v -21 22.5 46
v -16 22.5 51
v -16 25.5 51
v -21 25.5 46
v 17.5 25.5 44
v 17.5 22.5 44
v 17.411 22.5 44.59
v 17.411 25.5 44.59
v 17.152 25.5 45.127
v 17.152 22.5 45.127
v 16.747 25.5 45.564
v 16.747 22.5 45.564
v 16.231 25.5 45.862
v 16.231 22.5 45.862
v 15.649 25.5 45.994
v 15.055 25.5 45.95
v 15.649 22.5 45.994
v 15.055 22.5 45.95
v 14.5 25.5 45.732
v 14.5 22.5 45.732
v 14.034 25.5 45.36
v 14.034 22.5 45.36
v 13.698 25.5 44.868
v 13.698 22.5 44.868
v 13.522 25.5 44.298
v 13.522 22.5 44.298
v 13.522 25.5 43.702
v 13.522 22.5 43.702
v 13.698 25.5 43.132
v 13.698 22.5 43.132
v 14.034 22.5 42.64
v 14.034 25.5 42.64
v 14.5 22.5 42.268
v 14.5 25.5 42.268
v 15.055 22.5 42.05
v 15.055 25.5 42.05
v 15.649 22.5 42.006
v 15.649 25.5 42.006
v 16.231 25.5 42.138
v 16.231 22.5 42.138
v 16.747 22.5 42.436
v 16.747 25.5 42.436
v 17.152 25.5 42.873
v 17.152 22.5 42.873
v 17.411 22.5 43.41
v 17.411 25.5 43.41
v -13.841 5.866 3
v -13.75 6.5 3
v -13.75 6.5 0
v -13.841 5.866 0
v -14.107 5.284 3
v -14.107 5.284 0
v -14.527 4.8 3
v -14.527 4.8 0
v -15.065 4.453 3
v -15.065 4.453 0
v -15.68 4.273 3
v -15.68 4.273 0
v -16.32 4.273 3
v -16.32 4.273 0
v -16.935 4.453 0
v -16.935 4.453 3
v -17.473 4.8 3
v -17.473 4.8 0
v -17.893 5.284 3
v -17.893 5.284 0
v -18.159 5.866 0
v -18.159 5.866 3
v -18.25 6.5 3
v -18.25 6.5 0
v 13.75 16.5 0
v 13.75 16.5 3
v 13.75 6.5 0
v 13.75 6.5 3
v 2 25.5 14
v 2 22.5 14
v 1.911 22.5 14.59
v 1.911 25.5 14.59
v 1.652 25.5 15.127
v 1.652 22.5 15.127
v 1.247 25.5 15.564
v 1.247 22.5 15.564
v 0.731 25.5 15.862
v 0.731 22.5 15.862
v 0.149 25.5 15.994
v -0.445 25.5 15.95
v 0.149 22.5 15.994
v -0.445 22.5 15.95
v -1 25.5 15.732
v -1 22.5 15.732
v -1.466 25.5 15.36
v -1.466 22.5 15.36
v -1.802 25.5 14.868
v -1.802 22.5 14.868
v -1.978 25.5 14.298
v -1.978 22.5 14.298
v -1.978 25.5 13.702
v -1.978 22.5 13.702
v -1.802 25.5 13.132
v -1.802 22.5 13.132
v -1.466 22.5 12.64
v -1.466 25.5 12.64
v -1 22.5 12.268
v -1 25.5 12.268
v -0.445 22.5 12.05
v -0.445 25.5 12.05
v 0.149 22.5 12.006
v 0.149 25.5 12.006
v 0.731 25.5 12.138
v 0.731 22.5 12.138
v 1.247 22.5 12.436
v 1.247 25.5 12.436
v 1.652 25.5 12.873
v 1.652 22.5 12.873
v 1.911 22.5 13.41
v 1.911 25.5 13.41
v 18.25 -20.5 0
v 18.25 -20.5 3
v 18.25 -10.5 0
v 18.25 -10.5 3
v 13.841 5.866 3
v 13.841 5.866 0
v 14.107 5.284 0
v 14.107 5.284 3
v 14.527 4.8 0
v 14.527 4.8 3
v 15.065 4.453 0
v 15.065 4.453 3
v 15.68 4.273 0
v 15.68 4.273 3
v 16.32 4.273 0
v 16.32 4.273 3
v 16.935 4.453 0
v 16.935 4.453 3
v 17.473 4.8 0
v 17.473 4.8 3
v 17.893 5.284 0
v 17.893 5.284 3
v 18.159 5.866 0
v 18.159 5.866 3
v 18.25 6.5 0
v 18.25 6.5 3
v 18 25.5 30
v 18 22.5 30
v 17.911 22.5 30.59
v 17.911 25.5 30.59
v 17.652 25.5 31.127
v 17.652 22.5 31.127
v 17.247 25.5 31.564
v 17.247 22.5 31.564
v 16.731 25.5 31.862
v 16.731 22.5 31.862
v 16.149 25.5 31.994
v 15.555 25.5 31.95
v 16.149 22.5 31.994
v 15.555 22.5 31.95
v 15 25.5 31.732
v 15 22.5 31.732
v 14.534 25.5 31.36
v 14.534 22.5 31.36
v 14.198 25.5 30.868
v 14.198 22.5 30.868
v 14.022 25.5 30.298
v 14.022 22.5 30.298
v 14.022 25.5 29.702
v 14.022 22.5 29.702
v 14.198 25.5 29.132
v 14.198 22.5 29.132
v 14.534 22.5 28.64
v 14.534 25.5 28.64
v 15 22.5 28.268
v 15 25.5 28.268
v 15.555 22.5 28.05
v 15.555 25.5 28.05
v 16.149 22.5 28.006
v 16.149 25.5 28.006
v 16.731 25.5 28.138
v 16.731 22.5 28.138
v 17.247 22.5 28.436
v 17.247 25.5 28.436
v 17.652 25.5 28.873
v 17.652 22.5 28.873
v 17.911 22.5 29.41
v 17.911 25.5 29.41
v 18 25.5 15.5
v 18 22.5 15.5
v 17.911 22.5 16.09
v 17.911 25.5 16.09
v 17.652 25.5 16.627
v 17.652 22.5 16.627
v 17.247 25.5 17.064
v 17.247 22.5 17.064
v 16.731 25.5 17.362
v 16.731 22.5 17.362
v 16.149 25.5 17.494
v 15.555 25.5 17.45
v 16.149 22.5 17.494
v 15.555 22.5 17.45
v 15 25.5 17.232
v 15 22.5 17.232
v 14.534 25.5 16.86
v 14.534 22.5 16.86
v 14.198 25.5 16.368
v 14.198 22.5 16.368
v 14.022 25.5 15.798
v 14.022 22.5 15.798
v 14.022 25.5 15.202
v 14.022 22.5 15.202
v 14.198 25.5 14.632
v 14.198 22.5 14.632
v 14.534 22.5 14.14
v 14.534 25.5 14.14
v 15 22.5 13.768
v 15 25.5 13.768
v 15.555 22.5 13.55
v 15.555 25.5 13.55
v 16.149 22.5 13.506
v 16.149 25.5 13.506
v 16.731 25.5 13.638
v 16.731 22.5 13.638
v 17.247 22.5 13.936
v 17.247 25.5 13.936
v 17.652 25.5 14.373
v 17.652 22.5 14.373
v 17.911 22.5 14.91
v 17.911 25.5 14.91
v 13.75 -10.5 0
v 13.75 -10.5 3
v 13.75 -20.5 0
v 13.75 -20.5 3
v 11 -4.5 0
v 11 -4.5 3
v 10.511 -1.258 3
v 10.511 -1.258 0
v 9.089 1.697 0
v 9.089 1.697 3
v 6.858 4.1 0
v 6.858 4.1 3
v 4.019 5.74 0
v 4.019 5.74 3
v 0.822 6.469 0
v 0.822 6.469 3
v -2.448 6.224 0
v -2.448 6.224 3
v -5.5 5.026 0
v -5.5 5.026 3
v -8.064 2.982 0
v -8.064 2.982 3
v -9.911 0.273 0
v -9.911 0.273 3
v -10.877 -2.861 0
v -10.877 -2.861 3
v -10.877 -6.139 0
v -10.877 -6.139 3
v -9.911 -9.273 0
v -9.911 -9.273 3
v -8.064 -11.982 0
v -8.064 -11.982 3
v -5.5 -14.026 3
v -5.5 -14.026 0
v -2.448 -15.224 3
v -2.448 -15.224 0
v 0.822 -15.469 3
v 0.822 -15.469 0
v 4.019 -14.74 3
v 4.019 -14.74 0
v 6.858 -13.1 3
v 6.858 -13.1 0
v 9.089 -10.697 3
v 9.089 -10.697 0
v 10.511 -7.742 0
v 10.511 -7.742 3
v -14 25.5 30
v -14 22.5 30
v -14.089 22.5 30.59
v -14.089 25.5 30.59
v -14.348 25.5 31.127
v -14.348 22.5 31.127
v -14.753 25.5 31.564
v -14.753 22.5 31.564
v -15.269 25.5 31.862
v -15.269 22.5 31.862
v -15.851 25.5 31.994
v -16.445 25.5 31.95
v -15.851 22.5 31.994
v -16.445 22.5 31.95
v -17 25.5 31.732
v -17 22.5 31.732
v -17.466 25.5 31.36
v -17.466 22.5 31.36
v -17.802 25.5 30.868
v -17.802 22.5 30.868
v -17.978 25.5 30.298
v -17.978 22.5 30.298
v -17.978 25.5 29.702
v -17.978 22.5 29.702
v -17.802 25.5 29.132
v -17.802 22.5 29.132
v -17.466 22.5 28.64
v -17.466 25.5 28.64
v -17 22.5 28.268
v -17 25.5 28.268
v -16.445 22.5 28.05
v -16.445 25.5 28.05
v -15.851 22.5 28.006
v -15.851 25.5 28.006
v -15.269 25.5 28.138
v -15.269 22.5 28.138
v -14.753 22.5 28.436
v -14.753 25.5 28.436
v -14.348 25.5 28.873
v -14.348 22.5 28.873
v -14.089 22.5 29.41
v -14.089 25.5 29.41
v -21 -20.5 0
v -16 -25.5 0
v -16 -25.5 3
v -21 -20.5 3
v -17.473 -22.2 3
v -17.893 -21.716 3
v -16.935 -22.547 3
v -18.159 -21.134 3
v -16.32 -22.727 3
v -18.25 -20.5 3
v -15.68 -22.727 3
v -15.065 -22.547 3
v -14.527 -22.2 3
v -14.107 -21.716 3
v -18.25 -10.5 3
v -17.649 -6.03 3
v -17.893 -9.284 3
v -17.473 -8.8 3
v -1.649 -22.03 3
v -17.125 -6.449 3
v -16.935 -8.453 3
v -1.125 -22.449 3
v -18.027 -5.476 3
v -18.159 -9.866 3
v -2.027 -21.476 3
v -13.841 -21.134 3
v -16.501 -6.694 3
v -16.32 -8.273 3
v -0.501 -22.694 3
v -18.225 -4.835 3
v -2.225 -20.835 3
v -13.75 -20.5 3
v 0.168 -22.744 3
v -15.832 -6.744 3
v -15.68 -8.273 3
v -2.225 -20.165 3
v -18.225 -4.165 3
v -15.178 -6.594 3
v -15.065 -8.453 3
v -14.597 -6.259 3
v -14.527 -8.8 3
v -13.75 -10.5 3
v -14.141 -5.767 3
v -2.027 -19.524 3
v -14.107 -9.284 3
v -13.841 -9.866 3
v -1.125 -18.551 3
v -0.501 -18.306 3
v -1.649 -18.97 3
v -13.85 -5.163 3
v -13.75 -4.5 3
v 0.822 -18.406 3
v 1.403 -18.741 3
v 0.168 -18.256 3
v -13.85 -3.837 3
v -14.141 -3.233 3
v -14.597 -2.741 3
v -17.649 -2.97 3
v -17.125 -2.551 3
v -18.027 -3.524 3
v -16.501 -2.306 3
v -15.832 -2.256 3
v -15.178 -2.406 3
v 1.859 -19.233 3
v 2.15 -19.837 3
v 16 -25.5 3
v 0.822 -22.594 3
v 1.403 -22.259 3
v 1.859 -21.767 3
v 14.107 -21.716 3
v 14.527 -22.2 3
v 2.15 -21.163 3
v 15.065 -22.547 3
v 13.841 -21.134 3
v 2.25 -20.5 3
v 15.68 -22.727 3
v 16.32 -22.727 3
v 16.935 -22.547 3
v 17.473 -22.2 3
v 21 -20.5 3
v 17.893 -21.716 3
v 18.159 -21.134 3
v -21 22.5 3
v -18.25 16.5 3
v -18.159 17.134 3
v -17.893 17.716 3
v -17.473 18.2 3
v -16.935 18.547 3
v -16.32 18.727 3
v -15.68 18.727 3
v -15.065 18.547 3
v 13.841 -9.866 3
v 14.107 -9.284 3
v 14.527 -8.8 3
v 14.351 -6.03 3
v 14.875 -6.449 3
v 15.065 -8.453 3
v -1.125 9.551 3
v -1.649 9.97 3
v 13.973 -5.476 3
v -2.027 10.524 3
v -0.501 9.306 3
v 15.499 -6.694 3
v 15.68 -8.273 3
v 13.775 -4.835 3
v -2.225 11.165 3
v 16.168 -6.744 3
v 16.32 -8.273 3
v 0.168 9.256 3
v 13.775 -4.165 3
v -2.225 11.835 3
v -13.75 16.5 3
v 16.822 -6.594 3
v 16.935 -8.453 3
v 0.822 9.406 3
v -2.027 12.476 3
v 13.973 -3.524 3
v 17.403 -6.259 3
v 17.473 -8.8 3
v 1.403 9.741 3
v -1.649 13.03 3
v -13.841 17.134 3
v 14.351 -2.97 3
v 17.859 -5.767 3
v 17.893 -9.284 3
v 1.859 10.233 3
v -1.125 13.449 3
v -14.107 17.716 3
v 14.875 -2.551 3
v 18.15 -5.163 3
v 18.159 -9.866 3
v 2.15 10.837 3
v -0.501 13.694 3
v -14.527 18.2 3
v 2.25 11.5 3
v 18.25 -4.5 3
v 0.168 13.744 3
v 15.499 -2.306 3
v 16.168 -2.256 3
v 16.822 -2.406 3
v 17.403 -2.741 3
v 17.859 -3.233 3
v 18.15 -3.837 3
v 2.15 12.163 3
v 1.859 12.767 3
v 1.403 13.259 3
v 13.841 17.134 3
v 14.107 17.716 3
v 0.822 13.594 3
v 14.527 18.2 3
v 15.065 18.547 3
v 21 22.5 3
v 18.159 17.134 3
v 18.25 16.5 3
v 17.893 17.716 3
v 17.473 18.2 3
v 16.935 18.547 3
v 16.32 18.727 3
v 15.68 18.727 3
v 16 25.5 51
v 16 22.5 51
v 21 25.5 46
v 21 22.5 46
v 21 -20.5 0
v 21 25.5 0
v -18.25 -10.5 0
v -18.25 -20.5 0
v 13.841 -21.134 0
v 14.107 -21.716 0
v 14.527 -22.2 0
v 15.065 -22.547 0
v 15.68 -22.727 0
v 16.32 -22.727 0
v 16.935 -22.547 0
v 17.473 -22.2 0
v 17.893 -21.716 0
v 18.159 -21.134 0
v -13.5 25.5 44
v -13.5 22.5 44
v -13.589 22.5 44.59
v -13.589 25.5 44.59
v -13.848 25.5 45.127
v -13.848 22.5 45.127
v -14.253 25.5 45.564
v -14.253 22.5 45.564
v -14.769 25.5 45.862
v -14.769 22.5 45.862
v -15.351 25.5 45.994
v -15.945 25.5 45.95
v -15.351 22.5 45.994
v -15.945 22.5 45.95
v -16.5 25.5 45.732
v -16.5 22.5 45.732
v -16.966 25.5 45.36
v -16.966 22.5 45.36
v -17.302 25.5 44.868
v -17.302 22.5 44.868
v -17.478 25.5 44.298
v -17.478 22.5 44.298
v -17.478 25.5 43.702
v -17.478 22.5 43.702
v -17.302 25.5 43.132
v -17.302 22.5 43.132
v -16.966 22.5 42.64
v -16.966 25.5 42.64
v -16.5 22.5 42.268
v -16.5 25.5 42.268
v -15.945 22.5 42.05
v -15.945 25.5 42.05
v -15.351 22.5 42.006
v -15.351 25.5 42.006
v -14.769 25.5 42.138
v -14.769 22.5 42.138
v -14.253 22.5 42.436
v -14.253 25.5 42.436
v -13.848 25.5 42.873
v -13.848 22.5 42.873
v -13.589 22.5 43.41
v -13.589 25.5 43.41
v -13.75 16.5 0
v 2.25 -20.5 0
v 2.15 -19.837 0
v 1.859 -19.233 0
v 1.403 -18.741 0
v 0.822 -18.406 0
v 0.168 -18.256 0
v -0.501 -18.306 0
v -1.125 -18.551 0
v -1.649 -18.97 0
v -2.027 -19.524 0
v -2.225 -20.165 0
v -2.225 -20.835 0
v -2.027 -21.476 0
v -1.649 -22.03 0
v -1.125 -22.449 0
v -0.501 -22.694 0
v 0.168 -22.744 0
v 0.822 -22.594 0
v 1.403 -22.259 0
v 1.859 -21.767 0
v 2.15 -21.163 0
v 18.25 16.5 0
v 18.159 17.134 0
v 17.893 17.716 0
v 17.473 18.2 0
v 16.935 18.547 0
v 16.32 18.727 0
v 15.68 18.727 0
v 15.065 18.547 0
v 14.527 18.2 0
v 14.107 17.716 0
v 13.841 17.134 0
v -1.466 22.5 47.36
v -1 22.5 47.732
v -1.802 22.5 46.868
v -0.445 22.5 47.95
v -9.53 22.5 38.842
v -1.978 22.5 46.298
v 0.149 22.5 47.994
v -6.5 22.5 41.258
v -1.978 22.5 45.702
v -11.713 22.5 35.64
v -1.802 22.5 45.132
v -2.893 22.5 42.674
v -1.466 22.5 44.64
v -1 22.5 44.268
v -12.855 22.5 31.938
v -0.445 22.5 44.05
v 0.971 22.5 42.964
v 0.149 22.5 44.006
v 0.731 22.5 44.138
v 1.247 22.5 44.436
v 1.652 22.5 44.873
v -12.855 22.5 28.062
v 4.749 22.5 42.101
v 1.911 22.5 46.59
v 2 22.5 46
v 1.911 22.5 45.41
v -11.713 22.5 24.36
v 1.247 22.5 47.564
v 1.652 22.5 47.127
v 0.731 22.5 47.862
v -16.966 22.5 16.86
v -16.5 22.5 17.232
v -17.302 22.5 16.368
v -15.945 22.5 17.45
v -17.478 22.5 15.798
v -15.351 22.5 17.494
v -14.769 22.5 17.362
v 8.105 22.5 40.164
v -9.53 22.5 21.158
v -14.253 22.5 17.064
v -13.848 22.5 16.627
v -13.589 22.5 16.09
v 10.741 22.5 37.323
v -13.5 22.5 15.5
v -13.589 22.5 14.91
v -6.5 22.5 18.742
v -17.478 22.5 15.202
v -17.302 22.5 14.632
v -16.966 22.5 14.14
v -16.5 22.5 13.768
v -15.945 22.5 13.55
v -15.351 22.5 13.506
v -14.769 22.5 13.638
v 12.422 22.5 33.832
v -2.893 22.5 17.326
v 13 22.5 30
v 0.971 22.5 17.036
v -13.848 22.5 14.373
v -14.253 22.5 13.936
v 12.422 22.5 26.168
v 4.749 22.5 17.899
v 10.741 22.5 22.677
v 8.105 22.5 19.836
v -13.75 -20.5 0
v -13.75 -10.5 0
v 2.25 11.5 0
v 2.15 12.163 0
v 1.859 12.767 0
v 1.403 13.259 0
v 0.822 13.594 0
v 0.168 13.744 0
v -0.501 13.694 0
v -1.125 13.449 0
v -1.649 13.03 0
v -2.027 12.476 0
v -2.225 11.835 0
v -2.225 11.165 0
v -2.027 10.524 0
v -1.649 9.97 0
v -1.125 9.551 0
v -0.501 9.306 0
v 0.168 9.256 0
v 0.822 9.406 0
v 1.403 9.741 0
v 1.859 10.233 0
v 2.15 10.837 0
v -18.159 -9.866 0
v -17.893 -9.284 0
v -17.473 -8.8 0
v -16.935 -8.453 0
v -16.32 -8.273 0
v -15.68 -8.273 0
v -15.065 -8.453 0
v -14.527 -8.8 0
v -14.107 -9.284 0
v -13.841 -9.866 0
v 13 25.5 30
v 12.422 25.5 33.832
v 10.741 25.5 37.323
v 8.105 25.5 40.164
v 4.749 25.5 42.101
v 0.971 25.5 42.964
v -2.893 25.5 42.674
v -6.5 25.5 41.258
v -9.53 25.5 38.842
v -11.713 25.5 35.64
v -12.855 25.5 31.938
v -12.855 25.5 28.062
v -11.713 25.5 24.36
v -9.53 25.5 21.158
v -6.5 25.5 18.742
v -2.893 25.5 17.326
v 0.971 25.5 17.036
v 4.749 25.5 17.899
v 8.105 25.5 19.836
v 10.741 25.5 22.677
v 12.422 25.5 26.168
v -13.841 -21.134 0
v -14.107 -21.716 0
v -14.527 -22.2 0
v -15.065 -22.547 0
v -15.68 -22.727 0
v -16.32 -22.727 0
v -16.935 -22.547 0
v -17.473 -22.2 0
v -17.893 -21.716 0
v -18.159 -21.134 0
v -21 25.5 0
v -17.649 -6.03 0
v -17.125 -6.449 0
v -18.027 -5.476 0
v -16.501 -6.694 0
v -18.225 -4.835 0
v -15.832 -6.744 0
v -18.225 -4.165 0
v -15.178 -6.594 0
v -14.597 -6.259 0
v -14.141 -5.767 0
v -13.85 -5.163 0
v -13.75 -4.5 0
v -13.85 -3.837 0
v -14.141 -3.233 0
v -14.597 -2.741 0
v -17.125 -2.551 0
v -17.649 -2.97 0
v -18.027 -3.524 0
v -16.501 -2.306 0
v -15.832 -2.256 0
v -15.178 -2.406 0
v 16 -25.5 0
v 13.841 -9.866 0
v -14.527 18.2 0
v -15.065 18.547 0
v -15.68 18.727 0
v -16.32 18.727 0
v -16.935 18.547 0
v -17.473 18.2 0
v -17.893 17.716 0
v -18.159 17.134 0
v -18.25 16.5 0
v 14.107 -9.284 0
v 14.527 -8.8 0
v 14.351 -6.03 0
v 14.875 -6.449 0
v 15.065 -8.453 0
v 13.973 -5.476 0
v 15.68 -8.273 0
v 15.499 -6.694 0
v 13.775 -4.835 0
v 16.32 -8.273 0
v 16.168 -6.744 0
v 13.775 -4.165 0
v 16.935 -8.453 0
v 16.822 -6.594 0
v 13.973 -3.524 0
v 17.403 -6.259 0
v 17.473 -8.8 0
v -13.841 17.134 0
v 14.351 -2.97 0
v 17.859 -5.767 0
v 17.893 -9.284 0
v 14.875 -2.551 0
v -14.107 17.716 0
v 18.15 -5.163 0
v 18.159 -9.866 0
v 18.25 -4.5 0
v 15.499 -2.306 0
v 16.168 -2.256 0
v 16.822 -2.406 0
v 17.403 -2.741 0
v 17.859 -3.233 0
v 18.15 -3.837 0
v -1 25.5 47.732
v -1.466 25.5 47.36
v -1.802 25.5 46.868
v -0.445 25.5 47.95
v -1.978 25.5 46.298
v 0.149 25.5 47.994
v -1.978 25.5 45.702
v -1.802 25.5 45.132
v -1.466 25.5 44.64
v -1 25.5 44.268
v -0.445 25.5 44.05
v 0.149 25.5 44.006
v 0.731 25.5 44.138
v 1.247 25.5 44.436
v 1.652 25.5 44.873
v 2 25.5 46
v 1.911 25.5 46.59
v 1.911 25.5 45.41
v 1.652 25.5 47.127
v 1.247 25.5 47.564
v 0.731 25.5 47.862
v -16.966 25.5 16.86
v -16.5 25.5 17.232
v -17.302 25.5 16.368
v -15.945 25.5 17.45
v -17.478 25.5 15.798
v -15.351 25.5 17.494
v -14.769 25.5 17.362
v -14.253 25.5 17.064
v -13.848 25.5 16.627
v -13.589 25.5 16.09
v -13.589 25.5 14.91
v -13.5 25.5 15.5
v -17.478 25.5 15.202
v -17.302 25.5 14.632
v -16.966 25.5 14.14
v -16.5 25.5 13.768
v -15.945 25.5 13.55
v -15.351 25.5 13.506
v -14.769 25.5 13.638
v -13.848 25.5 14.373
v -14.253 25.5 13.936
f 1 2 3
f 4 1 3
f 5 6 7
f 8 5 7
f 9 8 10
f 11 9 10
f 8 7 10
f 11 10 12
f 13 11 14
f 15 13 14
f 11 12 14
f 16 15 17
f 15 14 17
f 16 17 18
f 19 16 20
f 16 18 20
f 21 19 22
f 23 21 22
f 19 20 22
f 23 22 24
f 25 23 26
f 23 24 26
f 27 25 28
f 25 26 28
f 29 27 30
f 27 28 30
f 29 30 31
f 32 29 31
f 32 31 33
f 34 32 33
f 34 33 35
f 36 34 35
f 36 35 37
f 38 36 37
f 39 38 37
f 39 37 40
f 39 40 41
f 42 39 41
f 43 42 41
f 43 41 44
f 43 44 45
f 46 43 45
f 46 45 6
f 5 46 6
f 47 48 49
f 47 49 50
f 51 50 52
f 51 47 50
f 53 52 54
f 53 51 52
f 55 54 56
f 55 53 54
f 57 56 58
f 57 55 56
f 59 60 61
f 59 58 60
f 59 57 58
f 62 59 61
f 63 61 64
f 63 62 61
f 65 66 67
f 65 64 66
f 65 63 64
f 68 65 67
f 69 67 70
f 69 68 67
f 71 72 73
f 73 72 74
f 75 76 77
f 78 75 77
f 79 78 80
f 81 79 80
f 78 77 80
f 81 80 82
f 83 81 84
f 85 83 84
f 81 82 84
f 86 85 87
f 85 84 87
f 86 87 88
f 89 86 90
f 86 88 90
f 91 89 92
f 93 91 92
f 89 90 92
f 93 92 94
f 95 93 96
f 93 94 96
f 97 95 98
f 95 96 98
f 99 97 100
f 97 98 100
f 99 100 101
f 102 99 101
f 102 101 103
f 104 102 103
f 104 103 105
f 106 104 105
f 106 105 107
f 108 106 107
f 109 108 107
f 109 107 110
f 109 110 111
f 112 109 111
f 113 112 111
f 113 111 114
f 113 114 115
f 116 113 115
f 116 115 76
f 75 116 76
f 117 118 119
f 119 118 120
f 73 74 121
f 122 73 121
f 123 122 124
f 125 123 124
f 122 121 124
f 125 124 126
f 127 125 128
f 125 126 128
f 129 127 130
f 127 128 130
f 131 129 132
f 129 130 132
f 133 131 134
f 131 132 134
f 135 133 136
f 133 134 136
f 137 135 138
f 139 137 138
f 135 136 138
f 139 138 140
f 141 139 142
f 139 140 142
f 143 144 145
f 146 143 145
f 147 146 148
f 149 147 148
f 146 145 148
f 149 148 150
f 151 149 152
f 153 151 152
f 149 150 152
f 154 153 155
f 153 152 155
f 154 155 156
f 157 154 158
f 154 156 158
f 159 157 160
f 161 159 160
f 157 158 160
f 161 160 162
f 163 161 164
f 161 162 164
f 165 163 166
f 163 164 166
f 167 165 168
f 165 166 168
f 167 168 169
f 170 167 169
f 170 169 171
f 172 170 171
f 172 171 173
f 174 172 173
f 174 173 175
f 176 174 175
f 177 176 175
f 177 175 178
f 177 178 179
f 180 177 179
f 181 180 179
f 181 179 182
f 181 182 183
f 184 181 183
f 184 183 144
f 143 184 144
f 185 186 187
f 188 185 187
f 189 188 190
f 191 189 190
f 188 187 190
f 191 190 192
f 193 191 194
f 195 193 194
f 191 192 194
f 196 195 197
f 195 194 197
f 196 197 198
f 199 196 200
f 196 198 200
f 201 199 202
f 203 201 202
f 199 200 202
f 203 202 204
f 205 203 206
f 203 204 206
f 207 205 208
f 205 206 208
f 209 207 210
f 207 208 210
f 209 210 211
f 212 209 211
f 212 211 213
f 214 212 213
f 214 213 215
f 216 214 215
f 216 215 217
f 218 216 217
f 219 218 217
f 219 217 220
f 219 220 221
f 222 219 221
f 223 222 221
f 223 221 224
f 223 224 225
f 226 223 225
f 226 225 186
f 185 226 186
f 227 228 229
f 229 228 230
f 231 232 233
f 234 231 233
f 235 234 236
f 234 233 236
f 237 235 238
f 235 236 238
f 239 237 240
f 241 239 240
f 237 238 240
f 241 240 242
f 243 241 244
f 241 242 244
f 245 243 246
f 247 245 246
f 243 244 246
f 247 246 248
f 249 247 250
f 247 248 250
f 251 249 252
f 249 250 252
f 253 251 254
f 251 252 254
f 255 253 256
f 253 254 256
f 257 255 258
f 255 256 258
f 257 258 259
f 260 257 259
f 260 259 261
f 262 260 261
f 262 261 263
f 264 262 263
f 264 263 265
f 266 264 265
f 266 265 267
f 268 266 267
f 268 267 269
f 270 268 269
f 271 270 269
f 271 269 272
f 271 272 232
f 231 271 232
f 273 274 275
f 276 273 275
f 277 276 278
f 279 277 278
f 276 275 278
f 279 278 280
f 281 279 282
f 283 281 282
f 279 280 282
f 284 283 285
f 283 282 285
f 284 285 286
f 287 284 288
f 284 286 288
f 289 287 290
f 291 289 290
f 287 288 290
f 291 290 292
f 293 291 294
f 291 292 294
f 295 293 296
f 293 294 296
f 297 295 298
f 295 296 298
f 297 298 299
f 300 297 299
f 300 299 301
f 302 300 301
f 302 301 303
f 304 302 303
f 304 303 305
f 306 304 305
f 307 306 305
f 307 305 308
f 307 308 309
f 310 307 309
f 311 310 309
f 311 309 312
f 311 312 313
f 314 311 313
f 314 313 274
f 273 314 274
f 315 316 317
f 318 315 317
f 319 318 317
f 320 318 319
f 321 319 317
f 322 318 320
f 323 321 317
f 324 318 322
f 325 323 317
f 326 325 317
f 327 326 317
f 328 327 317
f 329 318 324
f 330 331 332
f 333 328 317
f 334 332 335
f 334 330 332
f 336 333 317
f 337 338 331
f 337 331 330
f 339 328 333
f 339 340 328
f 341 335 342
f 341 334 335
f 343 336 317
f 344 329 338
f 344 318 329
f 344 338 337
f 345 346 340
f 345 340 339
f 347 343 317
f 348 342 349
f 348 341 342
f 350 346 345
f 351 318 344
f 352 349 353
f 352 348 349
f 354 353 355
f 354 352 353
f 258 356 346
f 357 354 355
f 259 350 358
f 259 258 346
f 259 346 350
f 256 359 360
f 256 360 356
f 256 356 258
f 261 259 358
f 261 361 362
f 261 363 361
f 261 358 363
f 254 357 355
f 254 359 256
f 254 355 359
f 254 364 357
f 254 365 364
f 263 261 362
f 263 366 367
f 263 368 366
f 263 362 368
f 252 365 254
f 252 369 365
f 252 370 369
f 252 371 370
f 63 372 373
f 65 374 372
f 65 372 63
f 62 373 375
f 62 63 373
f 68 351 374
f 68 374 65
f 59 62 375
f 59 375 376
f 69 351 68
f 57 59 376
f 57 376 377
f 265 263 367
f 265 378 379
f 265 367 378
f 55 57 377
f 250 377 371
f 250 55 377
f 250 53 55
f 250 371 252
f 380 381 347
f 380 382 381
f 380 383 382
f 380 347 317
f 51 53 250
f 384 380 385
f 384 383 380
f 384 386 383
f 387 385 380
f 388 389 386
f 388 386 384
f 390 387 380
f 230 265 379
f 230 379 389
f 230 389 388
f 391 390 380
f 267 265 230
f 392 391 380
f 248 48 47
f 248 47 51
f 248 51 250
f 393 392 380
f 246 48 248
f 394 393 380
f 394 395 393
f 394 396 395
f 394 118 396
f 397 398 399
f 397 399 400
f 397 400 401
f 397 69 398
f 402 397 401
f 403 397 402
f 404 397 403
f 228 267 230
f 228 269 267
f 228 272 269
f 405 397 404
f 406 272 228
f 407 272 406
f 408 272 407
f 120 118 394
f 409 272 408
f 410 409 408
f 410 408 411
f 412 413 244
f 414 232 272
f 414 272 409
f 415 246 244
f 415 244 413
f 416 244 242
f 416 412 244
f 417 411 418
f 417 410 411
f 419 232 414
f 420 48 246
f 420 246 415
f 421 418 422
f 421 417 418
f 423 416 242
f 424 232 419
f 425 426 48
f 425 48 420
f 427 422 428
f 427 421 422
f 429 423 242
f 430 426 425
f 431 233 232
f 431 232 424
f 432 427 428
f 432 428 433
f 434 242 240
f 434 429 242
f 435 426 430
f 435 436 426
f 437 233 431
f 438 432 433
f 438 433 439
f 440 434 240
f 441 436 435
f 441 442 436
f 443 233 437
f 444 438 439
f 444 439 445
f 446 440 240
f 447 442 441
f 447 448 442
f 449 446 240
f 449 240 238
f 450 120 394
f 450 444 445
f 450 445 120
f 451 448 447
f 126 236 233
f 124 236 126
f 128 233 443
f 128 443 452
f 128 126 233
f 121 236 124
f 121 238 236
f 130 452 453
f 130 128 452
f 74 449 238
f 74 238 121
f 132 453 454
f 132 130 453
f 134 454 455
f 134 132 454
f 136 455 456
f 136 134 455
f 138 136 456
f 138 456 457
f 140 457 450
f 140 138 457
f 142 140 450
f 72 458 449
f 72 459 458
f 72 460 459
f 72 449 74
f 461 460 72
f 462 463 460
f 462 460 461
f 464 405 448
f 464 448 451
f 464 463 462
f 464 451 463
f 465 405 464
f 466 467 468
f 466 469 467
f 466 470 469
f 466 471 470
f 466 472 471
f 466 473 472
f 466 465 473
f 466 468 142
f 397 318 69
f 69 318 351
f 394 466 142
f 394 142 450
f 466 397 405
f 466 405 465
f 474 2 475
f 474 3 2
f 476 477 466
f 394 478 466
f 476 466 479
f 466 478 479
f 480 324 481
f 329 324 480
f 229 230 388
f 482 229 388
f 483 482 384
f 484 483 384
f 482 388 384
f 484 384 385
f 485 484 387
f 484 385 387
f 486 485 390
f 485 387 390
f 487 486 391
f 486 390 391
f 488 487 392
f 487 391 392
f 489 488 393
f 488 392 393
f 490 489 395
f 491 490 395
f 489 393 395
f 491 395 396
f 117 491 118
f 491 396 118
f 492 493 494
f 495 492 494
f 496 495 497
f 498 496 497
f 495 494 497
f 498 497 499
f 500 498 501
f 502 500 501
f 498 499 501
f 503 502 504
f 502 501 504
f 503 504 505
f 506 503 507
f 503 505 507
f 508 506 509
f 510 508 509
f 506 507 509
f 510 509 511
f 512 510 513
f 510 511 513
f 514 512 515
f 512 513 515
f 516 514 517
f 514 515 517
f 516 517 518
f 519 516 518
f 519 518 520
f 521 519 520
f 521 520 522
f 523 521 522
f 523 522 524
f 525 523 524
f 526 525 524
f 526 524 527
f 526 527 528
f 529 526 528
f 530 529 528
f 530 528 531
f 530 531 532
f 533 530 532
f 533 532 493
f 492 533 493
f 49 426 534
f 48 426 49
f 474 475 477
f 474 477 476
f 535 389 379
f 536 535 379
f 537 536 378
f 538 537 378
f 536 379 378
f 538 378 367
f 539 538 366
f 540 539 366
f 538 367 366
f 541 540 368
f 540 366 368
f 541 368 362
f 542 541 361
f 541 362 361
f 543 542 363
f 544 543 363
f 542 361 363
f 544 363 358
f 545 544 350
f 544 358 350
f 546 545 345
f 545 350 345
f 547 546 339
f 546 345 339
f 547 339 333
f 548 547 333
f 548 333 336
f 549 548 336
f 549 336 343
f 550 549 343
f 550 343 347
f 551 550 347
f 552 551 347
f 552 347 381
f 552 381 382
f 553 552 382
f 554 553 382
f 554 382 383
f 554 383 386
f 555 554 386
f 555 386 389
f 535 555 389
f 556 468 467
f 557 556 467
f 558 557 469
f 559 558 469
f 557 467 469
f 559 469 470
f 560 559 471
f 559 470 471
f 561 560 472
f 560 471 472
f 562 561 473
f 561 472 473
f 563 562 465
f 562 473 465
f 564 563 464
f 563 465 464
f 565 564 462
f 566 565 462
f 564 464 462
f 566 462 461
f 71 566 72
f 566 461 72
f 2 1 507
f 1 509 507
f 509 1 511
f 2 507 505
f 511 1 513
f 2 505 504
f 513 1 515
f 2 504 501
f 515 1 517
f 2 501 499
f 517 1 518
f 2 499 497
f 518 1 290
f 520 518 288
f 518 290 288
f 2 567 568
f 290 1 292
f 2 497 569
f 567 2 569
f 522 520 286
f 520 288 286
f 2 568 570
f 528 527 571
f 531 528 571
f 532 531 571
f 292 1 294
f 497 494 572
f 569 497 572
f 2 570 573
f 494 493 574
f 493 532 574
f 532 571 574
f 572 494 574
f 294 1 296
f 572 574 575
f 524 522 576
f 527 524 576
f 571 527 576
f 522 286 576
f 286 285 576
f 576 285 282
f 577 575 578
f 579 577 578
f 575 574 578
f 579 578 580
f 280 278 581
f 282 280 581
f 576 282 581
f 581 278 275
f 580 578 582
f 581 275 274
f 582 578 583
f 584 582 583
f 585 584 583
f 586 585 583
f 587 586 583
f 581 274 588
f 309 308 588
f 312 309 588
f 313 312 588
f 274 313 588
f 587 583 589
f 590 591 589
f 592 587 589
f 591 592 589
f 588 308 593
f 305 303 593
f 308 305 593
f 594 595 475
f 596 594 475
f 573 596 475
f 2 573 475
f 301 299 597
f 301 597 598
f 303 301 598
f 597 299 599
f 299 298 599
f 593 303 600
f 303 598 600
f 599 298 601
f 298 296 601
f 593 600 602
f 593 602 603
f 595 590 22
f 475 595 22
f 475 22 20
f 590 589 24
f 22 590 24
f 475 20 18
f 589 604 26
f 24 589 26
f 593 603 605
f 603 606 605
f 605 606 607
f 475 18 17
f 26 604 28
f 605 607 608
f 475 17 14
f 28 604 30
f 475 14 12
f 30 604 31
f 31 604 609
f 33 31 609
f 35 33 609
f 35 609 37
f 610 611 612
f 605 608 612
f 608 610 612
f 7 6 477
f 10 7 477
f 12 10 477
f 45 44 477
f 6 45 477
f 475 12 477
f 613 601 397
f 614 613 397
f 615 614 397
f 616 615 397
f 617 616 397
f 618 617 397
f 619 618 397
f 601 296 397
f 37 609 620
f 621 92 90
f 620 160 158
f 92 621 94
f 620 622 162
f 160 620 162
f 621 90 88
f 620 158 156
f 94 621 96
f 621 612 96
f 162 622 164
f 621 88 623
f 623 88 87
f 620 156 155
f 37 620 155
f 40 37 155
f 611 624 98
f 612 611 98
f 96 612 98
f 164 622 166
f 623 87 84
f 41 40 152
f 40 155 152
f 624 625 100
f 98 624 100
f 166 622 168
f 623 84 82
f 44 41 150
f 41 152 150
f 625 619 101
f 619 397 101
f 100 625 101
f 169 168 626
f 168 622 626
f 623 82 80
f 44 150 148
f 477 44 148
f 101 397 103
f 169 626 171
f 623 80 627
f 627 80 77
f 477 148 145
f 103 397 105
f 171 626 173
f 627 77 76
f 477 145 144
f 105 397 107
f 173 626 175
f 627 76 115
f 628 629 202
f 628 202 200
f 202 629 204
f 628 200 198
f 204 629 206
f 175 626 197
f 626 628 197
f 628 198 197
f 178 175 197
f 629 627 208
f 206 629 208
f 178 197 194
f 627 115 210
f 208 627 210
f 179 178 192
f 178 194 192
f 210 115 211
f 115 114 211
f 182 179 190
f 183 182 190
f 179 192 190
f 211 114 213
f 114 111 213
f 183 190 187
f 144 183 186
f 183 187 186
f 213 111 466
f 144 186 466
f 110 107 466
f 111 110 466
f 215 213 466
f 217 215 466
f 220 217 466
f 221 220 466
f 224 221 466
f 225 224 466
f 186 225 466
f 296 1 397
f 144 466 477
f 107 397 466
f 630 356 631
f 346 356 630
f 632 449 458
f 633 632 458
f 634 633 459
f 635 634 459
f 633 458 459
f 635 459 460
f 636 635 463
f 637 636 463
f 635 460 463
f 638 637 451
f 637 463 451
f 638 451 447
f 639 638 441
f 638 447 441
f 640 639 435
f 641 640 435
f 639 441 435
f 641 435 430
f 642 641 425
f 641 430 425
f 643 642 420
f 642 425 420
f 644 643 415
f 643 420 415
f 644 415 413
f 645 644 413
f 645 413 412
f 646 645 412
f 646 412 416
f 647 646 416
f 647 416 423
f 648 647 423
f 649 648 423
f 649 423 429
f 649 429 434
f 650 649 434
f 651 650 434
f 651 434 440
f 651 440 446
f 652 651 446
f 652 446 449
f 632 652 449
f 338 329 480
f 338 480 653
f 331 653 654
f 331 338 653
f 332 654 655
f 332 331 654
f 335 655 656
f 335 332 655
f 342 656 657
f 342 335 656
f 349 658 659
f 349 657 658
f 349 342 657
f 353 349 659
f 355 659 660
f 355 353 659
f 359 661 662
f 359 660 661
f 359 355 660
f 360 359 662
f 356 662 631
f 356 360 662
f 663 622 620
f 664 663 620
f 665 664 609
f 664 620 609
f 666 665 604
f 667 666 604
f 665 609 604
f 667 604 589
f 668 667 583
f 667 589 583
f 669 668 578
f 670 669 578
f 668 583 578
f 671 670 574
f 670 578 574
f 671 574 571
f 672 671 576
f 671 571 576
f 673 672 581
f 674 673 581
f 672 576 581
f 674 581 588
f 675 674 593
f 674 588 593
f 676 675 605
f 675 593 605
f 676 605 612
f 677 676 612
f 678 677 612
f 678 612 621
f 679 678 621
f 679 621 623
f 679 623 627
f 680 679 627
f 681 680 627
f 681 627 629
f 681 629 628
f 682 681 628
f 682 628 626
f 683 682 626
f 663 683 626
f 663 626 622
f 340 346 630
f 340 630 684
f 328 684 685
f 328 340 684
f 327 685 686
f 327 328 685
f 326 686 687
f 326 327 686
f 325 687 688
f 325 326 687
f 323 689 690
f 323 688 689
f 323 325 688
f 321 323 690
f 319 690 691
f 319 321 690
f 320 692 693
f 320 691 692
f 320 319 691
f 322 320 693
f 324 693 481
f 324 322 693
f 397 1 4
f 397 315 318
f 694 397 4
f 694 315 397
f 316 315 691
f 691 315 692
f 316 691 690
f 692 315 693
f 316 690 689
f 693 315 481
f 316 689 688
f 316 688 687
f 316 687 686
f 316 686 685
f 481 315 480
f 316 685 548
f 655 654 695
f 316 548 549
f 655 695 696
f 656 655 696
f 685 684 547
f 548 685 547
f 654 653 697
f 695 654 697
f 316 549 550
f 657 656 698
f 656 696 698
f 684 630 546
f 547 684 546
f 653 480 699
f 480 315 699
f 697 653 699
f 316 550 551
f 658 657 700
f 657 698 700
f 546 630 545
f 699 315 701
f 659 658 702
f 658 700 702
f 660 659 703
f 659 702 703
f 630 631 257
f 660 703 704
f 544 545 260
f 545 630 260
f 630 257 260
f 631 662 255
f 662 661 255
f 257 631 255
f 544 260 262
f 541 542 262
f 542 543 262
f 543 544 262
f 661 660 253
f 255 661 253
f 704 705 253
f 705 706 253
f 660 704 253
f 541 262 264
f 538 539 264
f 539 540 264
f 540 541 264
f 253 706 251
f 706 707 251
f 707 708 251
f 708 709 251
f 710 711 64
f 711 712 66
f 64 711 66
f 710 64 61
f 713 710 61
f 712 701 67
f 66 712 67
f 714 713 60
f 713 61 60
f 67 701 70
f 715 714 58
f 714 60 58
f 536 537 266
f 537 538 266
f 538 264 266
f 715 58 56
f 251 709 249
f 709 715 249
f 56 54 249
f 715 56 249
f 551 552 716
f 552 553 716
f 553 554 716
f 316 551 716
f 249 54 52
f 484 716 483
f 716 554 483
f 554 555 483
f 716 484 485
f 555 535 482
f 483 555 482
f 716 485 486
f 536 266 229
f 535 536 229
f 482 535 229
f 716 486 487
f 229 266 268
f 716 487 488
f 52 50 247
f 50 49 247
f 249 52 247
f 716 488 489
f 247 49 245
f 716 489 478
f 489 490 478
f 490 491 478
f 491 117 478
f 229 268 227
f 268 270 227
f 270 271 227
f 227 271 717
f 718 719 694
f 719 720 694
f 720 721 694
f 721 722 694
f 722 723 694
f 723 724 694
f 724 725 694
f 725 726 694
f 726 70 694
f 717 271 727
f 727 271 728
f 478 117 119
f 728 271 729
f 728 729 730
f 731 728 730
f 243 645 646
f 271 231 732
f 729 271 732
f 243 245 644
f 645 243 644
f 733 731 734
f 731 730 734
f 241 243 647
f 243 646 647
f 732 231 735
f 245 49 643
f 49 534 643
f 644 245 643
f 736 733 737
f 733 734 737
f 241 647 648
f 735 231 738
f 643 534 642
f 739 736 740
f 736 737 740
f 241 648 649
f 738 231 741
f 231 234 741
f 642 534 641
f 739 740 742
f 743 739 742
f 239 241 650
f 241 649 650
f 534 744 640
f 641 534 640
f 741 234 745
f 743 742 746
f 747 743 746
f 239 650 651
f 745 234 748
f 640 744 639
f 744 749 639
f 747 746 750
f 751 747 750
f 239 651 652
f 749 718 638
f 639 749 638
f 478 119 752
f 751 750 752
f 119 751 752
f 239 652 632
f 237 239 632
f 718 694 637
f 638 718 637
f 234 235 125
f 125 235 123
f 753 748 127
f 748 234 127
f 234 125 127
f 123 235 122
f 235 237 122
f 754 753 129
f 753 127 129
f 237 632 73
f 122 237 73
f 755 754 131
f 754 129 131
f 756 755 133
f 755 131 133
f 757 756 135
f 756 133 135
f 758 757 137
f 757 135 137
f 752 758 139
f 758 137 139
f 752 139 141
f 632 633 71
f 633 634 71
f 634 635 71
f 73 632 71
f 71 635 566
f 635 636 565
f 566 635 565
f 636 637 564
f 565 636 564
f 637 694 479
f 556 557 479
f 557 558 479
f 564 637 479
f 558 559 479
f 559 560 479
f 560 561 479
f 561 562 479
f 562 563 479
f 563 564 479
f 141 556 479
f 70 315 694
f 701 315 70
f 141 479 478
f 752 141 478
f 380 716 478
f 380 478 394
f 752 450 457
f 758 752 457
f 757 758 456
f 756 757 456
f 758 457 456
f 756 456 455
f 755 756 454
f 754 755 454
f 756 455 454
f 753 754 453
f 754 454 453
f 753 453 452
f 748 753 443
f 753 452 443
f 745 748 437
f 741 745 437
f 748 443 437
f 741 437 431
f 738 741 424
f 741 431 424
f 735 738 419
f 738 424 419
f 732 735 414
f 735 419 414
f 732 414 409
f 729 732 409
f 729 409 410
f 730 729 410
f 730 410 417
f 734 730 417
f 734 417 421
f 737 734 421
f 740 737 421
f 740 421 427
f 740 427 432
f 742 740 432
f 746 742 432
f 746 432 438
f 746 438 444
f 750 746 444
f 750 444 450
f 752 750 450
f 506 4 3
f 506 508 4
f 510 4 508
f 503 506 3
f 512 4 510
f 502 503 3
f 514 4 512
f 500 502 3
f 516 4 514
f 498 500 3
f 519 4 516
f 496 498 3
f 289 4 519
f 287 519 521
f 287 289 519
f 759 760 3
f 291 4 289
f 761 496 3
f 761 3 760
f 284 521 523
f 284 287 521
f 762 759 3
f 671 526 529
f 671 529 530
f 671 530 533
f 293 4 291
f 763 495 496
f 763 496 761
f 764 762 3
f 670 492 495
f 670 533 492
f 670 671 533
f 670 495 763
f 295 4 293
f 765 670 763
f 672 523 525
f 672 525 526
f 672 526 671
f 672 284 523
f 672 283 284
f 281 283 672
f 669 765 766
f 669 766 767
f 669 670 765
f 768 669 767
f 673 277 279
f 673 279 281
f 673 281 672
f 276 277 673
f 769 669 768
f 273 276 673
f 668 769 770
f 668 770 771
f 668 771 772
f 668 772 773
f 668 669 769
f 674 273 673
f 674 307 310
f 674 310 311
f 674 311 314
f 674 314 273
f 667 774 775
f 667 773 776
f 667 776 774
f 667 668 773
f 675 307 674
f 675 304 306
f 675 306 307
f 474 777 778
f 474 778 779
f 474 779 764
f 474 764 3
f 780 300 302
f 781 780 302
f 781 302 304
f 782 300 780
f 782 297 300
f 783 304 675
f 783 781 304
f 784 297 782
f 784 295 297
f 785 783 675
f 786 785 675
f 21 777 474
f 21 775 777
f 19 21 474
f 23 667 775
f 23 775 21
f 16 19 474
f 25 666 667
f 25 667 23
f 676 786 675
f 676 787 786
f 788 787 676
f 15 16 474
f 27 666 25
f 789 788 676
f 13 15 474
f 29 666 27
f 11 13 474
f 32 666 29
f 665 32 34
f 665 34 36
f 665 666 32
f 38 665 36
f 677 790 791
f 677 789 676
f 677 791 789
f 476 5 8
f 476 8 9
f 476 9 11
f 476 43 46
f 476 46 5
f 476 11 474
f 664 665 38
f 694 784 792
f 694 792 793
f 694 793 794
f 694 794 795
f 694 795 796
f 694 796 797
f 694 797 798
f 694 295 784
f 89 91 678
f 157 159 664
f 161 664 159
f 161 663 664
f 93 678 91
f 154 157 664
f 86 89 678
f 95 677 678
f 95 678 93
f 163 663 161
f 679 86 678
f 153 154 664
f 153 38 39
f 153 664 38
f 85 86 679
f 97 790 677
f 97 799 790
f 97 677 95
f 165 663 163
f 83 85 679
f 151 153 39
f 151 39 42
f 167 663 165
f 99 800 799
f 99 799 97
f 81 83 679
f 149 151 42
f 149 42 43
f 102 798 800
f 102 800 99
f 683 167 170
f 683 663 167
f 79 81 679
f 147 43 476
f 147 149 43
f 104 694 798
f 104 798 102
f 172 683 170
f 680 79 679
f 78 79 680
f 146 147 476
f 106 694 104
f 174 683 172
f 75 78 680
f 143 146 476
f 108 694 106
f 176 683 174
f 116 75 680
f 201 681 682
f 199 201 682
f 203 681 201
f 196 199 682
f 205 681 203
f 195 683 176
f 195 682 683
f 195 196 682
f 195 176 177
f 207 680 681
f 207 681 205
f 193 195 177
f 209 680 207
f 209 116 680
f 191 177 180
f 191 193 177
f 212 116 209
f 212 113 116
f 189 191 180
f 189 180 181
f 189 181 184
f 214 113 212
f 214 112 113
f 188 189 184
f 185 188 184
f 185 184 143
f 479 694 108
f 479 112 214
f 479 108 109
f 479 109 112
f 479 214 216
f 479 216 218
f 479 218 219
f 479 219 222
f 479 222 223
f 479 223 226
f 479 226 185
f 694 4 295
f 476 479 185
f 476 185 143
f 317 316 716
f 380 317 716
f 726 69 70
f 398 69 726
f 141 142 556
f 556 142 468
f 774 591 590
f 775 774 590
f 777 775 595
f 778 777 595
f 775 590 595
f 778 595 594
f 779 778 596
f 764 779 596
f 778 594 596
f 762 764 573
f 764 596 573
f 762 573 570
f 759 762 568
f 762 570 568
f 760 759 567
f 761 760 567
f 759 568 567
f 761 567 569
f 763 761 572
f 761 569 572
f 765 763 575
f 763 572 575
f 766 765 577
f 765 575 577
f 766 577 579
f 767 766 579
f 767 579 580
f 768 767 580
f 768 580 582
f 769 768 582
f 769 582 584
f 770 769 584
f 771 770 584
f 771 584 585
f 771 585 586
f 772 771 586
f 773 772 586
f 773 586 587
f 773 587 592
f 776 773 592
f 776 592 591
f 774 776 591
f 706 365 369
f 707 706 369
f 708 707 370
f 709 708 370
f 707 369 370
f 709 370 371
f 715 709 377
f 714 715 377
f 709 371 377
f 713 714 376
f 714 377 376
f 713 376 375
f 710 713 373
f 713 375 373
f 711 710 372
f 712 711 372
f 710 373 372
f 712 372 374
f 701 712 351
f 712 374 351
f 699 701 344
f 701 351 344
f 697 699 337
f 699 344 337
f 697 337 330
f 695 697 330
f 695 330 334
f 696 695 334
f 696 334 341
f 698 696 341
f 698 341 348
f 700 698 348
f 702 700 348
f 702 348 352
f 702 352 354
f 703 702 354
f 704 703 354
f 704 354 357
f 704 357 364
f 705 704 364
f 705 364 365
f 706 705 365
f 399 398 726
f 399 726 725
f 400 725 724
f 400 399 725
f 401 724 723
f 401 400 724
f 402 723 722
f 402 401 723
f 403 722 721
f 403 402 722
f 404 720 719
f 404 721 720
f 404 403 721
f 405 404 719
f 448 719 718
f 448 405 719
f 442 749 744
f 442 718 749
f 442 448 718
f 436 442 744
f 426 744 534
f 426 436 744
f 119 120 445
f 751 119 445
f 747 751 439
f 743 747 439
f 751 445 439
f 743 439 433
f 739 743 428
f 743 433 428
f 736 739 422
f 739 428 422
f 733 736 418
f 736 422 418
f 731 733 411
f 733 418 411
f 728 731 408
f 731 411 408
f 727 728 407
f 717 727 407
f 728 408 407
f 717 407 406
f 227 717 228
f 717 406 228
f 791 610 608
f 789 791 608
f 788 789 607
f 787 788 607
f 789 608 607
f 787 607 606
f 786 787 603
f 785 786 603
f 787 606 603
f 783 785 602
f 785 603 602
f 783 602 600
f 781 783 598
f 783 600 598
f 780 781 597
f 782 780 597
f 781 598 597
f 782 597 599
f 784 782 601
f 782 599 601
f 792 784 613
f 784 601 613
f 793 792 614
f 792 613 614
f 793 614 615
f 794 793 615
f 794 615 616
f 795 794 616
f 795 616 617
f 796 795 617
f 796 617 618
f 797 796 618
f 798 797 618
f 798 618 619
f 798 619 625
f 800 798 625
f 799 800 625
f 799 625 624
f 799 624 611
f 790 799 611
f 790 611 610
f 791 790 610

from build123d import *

# Parameters (mm, degrees)
SKETCH_1_W          = 42
SKETCH_1_H          = 51
EXTRUDE_1_DEPTH     = 3
SKETCH_2_W          = 42
SKETCH_2_H          = 3
EXTRUDE_2_DEPTH     = 48
CHAMFER_1_SIZE      = 5
SKETCH_3_R          = 13
SKETCH_3_R_2        = 2
CUT_EXTRUDE_1_DEPTH = 48
SKETCH_4_R          = 2.25
SKETCH_4_R_2        = 11
CUT_EXTRUDE_2_DEPTH = 48


with BuildPart() as part:
    # 스케치1 → 보스-돌출1 (new body)
    with BuildSketch(Plane.XY):
        Rectangle(SKETCH_1_W, SKETCH_1_H)
    extrude(amount=EXTRUDE_1_DEPTH)

    # 스케치2 → 보스-돌출2 (add)
    with BuildSketch(Plane.XY.offset(3)):
        with Locations((0, 24)):
            Rectangle(SKETCH_2_W, SKETCH_2_H)
    extrude(amount=EXTRUDE_2_DEPTH)

    # 모따기1
    chamfer_1_edges = [part.edges().sort_by_distance(p)[0] for p in [
        (-21, 24, 51),
        (21, 24, 51),
        (21, -25.5, 1.5),
        (-21, -25.5, 1.5),
    ]]
    chamfer(chamfer_1_edges, length=CHAMFER_1_SIZE)

    # 스케치3 → 컷-돌출1 (cut)
    with BuildSketch(Plane.XZ.offset(-22.5)):
        with Locations((0, 30)):
            Circle(SKETCH_3_R)
        with Locations((-15.5, 44)):
            Circle(SKETCH_3_R_2)
        with Locations((-15.5, 15.5)):
            Circle(SKETCH_3_R_2)
        with Locations((0, 46)):
            Circle(SKETCH_3_R_2)
        with Locations((15.5, 44)):
            Circle(SKETCH_3_R_2)
        with Locations((16, 30)):
            Circle(SKETCH_3_R_2)
        with Locations((0, 14)):
            Circle(SKETCH_3_R_2)
        with Locations((-16, 30)):
            Circle(SKETCH_3_R_2)
        with Locations((16, 15.5)):
            Circle(SKETCH_3_R_2)
    extrude(amount=-CUT_EXTRUDE_1_DEPTH, mode=Mode.SUBTRACT)

    # 스케치4 → 컷-돌출2 (cut)
    with BuildSketch(Plane.XY.offset(3)):
        with Locations((0, -20.5)):
            Circle(SKETCH_4_R)
        with Locations((0, -4.5)):
            Circle(SKETCH_4_R_2)
        with Locations((-16, -4.5)):
            Circle(SKETCH_4_R)
        with Locations((0, 11.5)):
            Circle(SKETCH_4_R)
        with Locations((16, -4.5)):
            Circle(SKETCH_4_R)
        with BuildLine():
            Line((-13.75, 16.5), (-13.75, 6.5))
            ThreePointArc((-13.75, 6.5), (-16, 4.25), (-18.25, 6.5))
            Line((-18.25, 6.5), (-18.25, 16.5))
            ThreePointArc((-18.25, 16.5), (-16, 18.75), (-13.75, 16.5))
        make_face()
        with BuildLine():
            Line((-13.75, -10.5), (-13.75, -20.5))
            ThreePointArc((-13.75, -20.5), (-16, -22.75), (-18.25, -20.5))
            Line((-18.25, -20.5), (-18.25, -10.5))
            ThreePointArc((-18.25, -10.5), (-16, -8.25), (-13.75, -10.5))
        make_face()
        with BuildLine():
            Line((13.75, -10.5), (13.75, -20.5))
            ThreePointArc((13.75, -20.5), (16, -22.75), (18.25, -20.5))
            Line((18.25, -20.5), (18.25, -10.5))
            ThreePointArc((18.25, -10.5), (16, -8.25), (13.75, -10.5))
        make_face()
        with BuildLine():
            Line((13.75, 16.5), (13.75, 6.5))
            ThreePointArc((13.75, 6.5), (16, 4.25), (18.25, 6.5))
            Line((18.25, 6.5), (18.25, 16.5))
            ThreePointArc((18.25, 16.5), (16, 18.75), (13.75, 16.5))
        make_face()
    extrude(amount=-CUT_EXTRUDE_2_DEPTH, mode=Mode.SUBTRACT)


solid = part.part
